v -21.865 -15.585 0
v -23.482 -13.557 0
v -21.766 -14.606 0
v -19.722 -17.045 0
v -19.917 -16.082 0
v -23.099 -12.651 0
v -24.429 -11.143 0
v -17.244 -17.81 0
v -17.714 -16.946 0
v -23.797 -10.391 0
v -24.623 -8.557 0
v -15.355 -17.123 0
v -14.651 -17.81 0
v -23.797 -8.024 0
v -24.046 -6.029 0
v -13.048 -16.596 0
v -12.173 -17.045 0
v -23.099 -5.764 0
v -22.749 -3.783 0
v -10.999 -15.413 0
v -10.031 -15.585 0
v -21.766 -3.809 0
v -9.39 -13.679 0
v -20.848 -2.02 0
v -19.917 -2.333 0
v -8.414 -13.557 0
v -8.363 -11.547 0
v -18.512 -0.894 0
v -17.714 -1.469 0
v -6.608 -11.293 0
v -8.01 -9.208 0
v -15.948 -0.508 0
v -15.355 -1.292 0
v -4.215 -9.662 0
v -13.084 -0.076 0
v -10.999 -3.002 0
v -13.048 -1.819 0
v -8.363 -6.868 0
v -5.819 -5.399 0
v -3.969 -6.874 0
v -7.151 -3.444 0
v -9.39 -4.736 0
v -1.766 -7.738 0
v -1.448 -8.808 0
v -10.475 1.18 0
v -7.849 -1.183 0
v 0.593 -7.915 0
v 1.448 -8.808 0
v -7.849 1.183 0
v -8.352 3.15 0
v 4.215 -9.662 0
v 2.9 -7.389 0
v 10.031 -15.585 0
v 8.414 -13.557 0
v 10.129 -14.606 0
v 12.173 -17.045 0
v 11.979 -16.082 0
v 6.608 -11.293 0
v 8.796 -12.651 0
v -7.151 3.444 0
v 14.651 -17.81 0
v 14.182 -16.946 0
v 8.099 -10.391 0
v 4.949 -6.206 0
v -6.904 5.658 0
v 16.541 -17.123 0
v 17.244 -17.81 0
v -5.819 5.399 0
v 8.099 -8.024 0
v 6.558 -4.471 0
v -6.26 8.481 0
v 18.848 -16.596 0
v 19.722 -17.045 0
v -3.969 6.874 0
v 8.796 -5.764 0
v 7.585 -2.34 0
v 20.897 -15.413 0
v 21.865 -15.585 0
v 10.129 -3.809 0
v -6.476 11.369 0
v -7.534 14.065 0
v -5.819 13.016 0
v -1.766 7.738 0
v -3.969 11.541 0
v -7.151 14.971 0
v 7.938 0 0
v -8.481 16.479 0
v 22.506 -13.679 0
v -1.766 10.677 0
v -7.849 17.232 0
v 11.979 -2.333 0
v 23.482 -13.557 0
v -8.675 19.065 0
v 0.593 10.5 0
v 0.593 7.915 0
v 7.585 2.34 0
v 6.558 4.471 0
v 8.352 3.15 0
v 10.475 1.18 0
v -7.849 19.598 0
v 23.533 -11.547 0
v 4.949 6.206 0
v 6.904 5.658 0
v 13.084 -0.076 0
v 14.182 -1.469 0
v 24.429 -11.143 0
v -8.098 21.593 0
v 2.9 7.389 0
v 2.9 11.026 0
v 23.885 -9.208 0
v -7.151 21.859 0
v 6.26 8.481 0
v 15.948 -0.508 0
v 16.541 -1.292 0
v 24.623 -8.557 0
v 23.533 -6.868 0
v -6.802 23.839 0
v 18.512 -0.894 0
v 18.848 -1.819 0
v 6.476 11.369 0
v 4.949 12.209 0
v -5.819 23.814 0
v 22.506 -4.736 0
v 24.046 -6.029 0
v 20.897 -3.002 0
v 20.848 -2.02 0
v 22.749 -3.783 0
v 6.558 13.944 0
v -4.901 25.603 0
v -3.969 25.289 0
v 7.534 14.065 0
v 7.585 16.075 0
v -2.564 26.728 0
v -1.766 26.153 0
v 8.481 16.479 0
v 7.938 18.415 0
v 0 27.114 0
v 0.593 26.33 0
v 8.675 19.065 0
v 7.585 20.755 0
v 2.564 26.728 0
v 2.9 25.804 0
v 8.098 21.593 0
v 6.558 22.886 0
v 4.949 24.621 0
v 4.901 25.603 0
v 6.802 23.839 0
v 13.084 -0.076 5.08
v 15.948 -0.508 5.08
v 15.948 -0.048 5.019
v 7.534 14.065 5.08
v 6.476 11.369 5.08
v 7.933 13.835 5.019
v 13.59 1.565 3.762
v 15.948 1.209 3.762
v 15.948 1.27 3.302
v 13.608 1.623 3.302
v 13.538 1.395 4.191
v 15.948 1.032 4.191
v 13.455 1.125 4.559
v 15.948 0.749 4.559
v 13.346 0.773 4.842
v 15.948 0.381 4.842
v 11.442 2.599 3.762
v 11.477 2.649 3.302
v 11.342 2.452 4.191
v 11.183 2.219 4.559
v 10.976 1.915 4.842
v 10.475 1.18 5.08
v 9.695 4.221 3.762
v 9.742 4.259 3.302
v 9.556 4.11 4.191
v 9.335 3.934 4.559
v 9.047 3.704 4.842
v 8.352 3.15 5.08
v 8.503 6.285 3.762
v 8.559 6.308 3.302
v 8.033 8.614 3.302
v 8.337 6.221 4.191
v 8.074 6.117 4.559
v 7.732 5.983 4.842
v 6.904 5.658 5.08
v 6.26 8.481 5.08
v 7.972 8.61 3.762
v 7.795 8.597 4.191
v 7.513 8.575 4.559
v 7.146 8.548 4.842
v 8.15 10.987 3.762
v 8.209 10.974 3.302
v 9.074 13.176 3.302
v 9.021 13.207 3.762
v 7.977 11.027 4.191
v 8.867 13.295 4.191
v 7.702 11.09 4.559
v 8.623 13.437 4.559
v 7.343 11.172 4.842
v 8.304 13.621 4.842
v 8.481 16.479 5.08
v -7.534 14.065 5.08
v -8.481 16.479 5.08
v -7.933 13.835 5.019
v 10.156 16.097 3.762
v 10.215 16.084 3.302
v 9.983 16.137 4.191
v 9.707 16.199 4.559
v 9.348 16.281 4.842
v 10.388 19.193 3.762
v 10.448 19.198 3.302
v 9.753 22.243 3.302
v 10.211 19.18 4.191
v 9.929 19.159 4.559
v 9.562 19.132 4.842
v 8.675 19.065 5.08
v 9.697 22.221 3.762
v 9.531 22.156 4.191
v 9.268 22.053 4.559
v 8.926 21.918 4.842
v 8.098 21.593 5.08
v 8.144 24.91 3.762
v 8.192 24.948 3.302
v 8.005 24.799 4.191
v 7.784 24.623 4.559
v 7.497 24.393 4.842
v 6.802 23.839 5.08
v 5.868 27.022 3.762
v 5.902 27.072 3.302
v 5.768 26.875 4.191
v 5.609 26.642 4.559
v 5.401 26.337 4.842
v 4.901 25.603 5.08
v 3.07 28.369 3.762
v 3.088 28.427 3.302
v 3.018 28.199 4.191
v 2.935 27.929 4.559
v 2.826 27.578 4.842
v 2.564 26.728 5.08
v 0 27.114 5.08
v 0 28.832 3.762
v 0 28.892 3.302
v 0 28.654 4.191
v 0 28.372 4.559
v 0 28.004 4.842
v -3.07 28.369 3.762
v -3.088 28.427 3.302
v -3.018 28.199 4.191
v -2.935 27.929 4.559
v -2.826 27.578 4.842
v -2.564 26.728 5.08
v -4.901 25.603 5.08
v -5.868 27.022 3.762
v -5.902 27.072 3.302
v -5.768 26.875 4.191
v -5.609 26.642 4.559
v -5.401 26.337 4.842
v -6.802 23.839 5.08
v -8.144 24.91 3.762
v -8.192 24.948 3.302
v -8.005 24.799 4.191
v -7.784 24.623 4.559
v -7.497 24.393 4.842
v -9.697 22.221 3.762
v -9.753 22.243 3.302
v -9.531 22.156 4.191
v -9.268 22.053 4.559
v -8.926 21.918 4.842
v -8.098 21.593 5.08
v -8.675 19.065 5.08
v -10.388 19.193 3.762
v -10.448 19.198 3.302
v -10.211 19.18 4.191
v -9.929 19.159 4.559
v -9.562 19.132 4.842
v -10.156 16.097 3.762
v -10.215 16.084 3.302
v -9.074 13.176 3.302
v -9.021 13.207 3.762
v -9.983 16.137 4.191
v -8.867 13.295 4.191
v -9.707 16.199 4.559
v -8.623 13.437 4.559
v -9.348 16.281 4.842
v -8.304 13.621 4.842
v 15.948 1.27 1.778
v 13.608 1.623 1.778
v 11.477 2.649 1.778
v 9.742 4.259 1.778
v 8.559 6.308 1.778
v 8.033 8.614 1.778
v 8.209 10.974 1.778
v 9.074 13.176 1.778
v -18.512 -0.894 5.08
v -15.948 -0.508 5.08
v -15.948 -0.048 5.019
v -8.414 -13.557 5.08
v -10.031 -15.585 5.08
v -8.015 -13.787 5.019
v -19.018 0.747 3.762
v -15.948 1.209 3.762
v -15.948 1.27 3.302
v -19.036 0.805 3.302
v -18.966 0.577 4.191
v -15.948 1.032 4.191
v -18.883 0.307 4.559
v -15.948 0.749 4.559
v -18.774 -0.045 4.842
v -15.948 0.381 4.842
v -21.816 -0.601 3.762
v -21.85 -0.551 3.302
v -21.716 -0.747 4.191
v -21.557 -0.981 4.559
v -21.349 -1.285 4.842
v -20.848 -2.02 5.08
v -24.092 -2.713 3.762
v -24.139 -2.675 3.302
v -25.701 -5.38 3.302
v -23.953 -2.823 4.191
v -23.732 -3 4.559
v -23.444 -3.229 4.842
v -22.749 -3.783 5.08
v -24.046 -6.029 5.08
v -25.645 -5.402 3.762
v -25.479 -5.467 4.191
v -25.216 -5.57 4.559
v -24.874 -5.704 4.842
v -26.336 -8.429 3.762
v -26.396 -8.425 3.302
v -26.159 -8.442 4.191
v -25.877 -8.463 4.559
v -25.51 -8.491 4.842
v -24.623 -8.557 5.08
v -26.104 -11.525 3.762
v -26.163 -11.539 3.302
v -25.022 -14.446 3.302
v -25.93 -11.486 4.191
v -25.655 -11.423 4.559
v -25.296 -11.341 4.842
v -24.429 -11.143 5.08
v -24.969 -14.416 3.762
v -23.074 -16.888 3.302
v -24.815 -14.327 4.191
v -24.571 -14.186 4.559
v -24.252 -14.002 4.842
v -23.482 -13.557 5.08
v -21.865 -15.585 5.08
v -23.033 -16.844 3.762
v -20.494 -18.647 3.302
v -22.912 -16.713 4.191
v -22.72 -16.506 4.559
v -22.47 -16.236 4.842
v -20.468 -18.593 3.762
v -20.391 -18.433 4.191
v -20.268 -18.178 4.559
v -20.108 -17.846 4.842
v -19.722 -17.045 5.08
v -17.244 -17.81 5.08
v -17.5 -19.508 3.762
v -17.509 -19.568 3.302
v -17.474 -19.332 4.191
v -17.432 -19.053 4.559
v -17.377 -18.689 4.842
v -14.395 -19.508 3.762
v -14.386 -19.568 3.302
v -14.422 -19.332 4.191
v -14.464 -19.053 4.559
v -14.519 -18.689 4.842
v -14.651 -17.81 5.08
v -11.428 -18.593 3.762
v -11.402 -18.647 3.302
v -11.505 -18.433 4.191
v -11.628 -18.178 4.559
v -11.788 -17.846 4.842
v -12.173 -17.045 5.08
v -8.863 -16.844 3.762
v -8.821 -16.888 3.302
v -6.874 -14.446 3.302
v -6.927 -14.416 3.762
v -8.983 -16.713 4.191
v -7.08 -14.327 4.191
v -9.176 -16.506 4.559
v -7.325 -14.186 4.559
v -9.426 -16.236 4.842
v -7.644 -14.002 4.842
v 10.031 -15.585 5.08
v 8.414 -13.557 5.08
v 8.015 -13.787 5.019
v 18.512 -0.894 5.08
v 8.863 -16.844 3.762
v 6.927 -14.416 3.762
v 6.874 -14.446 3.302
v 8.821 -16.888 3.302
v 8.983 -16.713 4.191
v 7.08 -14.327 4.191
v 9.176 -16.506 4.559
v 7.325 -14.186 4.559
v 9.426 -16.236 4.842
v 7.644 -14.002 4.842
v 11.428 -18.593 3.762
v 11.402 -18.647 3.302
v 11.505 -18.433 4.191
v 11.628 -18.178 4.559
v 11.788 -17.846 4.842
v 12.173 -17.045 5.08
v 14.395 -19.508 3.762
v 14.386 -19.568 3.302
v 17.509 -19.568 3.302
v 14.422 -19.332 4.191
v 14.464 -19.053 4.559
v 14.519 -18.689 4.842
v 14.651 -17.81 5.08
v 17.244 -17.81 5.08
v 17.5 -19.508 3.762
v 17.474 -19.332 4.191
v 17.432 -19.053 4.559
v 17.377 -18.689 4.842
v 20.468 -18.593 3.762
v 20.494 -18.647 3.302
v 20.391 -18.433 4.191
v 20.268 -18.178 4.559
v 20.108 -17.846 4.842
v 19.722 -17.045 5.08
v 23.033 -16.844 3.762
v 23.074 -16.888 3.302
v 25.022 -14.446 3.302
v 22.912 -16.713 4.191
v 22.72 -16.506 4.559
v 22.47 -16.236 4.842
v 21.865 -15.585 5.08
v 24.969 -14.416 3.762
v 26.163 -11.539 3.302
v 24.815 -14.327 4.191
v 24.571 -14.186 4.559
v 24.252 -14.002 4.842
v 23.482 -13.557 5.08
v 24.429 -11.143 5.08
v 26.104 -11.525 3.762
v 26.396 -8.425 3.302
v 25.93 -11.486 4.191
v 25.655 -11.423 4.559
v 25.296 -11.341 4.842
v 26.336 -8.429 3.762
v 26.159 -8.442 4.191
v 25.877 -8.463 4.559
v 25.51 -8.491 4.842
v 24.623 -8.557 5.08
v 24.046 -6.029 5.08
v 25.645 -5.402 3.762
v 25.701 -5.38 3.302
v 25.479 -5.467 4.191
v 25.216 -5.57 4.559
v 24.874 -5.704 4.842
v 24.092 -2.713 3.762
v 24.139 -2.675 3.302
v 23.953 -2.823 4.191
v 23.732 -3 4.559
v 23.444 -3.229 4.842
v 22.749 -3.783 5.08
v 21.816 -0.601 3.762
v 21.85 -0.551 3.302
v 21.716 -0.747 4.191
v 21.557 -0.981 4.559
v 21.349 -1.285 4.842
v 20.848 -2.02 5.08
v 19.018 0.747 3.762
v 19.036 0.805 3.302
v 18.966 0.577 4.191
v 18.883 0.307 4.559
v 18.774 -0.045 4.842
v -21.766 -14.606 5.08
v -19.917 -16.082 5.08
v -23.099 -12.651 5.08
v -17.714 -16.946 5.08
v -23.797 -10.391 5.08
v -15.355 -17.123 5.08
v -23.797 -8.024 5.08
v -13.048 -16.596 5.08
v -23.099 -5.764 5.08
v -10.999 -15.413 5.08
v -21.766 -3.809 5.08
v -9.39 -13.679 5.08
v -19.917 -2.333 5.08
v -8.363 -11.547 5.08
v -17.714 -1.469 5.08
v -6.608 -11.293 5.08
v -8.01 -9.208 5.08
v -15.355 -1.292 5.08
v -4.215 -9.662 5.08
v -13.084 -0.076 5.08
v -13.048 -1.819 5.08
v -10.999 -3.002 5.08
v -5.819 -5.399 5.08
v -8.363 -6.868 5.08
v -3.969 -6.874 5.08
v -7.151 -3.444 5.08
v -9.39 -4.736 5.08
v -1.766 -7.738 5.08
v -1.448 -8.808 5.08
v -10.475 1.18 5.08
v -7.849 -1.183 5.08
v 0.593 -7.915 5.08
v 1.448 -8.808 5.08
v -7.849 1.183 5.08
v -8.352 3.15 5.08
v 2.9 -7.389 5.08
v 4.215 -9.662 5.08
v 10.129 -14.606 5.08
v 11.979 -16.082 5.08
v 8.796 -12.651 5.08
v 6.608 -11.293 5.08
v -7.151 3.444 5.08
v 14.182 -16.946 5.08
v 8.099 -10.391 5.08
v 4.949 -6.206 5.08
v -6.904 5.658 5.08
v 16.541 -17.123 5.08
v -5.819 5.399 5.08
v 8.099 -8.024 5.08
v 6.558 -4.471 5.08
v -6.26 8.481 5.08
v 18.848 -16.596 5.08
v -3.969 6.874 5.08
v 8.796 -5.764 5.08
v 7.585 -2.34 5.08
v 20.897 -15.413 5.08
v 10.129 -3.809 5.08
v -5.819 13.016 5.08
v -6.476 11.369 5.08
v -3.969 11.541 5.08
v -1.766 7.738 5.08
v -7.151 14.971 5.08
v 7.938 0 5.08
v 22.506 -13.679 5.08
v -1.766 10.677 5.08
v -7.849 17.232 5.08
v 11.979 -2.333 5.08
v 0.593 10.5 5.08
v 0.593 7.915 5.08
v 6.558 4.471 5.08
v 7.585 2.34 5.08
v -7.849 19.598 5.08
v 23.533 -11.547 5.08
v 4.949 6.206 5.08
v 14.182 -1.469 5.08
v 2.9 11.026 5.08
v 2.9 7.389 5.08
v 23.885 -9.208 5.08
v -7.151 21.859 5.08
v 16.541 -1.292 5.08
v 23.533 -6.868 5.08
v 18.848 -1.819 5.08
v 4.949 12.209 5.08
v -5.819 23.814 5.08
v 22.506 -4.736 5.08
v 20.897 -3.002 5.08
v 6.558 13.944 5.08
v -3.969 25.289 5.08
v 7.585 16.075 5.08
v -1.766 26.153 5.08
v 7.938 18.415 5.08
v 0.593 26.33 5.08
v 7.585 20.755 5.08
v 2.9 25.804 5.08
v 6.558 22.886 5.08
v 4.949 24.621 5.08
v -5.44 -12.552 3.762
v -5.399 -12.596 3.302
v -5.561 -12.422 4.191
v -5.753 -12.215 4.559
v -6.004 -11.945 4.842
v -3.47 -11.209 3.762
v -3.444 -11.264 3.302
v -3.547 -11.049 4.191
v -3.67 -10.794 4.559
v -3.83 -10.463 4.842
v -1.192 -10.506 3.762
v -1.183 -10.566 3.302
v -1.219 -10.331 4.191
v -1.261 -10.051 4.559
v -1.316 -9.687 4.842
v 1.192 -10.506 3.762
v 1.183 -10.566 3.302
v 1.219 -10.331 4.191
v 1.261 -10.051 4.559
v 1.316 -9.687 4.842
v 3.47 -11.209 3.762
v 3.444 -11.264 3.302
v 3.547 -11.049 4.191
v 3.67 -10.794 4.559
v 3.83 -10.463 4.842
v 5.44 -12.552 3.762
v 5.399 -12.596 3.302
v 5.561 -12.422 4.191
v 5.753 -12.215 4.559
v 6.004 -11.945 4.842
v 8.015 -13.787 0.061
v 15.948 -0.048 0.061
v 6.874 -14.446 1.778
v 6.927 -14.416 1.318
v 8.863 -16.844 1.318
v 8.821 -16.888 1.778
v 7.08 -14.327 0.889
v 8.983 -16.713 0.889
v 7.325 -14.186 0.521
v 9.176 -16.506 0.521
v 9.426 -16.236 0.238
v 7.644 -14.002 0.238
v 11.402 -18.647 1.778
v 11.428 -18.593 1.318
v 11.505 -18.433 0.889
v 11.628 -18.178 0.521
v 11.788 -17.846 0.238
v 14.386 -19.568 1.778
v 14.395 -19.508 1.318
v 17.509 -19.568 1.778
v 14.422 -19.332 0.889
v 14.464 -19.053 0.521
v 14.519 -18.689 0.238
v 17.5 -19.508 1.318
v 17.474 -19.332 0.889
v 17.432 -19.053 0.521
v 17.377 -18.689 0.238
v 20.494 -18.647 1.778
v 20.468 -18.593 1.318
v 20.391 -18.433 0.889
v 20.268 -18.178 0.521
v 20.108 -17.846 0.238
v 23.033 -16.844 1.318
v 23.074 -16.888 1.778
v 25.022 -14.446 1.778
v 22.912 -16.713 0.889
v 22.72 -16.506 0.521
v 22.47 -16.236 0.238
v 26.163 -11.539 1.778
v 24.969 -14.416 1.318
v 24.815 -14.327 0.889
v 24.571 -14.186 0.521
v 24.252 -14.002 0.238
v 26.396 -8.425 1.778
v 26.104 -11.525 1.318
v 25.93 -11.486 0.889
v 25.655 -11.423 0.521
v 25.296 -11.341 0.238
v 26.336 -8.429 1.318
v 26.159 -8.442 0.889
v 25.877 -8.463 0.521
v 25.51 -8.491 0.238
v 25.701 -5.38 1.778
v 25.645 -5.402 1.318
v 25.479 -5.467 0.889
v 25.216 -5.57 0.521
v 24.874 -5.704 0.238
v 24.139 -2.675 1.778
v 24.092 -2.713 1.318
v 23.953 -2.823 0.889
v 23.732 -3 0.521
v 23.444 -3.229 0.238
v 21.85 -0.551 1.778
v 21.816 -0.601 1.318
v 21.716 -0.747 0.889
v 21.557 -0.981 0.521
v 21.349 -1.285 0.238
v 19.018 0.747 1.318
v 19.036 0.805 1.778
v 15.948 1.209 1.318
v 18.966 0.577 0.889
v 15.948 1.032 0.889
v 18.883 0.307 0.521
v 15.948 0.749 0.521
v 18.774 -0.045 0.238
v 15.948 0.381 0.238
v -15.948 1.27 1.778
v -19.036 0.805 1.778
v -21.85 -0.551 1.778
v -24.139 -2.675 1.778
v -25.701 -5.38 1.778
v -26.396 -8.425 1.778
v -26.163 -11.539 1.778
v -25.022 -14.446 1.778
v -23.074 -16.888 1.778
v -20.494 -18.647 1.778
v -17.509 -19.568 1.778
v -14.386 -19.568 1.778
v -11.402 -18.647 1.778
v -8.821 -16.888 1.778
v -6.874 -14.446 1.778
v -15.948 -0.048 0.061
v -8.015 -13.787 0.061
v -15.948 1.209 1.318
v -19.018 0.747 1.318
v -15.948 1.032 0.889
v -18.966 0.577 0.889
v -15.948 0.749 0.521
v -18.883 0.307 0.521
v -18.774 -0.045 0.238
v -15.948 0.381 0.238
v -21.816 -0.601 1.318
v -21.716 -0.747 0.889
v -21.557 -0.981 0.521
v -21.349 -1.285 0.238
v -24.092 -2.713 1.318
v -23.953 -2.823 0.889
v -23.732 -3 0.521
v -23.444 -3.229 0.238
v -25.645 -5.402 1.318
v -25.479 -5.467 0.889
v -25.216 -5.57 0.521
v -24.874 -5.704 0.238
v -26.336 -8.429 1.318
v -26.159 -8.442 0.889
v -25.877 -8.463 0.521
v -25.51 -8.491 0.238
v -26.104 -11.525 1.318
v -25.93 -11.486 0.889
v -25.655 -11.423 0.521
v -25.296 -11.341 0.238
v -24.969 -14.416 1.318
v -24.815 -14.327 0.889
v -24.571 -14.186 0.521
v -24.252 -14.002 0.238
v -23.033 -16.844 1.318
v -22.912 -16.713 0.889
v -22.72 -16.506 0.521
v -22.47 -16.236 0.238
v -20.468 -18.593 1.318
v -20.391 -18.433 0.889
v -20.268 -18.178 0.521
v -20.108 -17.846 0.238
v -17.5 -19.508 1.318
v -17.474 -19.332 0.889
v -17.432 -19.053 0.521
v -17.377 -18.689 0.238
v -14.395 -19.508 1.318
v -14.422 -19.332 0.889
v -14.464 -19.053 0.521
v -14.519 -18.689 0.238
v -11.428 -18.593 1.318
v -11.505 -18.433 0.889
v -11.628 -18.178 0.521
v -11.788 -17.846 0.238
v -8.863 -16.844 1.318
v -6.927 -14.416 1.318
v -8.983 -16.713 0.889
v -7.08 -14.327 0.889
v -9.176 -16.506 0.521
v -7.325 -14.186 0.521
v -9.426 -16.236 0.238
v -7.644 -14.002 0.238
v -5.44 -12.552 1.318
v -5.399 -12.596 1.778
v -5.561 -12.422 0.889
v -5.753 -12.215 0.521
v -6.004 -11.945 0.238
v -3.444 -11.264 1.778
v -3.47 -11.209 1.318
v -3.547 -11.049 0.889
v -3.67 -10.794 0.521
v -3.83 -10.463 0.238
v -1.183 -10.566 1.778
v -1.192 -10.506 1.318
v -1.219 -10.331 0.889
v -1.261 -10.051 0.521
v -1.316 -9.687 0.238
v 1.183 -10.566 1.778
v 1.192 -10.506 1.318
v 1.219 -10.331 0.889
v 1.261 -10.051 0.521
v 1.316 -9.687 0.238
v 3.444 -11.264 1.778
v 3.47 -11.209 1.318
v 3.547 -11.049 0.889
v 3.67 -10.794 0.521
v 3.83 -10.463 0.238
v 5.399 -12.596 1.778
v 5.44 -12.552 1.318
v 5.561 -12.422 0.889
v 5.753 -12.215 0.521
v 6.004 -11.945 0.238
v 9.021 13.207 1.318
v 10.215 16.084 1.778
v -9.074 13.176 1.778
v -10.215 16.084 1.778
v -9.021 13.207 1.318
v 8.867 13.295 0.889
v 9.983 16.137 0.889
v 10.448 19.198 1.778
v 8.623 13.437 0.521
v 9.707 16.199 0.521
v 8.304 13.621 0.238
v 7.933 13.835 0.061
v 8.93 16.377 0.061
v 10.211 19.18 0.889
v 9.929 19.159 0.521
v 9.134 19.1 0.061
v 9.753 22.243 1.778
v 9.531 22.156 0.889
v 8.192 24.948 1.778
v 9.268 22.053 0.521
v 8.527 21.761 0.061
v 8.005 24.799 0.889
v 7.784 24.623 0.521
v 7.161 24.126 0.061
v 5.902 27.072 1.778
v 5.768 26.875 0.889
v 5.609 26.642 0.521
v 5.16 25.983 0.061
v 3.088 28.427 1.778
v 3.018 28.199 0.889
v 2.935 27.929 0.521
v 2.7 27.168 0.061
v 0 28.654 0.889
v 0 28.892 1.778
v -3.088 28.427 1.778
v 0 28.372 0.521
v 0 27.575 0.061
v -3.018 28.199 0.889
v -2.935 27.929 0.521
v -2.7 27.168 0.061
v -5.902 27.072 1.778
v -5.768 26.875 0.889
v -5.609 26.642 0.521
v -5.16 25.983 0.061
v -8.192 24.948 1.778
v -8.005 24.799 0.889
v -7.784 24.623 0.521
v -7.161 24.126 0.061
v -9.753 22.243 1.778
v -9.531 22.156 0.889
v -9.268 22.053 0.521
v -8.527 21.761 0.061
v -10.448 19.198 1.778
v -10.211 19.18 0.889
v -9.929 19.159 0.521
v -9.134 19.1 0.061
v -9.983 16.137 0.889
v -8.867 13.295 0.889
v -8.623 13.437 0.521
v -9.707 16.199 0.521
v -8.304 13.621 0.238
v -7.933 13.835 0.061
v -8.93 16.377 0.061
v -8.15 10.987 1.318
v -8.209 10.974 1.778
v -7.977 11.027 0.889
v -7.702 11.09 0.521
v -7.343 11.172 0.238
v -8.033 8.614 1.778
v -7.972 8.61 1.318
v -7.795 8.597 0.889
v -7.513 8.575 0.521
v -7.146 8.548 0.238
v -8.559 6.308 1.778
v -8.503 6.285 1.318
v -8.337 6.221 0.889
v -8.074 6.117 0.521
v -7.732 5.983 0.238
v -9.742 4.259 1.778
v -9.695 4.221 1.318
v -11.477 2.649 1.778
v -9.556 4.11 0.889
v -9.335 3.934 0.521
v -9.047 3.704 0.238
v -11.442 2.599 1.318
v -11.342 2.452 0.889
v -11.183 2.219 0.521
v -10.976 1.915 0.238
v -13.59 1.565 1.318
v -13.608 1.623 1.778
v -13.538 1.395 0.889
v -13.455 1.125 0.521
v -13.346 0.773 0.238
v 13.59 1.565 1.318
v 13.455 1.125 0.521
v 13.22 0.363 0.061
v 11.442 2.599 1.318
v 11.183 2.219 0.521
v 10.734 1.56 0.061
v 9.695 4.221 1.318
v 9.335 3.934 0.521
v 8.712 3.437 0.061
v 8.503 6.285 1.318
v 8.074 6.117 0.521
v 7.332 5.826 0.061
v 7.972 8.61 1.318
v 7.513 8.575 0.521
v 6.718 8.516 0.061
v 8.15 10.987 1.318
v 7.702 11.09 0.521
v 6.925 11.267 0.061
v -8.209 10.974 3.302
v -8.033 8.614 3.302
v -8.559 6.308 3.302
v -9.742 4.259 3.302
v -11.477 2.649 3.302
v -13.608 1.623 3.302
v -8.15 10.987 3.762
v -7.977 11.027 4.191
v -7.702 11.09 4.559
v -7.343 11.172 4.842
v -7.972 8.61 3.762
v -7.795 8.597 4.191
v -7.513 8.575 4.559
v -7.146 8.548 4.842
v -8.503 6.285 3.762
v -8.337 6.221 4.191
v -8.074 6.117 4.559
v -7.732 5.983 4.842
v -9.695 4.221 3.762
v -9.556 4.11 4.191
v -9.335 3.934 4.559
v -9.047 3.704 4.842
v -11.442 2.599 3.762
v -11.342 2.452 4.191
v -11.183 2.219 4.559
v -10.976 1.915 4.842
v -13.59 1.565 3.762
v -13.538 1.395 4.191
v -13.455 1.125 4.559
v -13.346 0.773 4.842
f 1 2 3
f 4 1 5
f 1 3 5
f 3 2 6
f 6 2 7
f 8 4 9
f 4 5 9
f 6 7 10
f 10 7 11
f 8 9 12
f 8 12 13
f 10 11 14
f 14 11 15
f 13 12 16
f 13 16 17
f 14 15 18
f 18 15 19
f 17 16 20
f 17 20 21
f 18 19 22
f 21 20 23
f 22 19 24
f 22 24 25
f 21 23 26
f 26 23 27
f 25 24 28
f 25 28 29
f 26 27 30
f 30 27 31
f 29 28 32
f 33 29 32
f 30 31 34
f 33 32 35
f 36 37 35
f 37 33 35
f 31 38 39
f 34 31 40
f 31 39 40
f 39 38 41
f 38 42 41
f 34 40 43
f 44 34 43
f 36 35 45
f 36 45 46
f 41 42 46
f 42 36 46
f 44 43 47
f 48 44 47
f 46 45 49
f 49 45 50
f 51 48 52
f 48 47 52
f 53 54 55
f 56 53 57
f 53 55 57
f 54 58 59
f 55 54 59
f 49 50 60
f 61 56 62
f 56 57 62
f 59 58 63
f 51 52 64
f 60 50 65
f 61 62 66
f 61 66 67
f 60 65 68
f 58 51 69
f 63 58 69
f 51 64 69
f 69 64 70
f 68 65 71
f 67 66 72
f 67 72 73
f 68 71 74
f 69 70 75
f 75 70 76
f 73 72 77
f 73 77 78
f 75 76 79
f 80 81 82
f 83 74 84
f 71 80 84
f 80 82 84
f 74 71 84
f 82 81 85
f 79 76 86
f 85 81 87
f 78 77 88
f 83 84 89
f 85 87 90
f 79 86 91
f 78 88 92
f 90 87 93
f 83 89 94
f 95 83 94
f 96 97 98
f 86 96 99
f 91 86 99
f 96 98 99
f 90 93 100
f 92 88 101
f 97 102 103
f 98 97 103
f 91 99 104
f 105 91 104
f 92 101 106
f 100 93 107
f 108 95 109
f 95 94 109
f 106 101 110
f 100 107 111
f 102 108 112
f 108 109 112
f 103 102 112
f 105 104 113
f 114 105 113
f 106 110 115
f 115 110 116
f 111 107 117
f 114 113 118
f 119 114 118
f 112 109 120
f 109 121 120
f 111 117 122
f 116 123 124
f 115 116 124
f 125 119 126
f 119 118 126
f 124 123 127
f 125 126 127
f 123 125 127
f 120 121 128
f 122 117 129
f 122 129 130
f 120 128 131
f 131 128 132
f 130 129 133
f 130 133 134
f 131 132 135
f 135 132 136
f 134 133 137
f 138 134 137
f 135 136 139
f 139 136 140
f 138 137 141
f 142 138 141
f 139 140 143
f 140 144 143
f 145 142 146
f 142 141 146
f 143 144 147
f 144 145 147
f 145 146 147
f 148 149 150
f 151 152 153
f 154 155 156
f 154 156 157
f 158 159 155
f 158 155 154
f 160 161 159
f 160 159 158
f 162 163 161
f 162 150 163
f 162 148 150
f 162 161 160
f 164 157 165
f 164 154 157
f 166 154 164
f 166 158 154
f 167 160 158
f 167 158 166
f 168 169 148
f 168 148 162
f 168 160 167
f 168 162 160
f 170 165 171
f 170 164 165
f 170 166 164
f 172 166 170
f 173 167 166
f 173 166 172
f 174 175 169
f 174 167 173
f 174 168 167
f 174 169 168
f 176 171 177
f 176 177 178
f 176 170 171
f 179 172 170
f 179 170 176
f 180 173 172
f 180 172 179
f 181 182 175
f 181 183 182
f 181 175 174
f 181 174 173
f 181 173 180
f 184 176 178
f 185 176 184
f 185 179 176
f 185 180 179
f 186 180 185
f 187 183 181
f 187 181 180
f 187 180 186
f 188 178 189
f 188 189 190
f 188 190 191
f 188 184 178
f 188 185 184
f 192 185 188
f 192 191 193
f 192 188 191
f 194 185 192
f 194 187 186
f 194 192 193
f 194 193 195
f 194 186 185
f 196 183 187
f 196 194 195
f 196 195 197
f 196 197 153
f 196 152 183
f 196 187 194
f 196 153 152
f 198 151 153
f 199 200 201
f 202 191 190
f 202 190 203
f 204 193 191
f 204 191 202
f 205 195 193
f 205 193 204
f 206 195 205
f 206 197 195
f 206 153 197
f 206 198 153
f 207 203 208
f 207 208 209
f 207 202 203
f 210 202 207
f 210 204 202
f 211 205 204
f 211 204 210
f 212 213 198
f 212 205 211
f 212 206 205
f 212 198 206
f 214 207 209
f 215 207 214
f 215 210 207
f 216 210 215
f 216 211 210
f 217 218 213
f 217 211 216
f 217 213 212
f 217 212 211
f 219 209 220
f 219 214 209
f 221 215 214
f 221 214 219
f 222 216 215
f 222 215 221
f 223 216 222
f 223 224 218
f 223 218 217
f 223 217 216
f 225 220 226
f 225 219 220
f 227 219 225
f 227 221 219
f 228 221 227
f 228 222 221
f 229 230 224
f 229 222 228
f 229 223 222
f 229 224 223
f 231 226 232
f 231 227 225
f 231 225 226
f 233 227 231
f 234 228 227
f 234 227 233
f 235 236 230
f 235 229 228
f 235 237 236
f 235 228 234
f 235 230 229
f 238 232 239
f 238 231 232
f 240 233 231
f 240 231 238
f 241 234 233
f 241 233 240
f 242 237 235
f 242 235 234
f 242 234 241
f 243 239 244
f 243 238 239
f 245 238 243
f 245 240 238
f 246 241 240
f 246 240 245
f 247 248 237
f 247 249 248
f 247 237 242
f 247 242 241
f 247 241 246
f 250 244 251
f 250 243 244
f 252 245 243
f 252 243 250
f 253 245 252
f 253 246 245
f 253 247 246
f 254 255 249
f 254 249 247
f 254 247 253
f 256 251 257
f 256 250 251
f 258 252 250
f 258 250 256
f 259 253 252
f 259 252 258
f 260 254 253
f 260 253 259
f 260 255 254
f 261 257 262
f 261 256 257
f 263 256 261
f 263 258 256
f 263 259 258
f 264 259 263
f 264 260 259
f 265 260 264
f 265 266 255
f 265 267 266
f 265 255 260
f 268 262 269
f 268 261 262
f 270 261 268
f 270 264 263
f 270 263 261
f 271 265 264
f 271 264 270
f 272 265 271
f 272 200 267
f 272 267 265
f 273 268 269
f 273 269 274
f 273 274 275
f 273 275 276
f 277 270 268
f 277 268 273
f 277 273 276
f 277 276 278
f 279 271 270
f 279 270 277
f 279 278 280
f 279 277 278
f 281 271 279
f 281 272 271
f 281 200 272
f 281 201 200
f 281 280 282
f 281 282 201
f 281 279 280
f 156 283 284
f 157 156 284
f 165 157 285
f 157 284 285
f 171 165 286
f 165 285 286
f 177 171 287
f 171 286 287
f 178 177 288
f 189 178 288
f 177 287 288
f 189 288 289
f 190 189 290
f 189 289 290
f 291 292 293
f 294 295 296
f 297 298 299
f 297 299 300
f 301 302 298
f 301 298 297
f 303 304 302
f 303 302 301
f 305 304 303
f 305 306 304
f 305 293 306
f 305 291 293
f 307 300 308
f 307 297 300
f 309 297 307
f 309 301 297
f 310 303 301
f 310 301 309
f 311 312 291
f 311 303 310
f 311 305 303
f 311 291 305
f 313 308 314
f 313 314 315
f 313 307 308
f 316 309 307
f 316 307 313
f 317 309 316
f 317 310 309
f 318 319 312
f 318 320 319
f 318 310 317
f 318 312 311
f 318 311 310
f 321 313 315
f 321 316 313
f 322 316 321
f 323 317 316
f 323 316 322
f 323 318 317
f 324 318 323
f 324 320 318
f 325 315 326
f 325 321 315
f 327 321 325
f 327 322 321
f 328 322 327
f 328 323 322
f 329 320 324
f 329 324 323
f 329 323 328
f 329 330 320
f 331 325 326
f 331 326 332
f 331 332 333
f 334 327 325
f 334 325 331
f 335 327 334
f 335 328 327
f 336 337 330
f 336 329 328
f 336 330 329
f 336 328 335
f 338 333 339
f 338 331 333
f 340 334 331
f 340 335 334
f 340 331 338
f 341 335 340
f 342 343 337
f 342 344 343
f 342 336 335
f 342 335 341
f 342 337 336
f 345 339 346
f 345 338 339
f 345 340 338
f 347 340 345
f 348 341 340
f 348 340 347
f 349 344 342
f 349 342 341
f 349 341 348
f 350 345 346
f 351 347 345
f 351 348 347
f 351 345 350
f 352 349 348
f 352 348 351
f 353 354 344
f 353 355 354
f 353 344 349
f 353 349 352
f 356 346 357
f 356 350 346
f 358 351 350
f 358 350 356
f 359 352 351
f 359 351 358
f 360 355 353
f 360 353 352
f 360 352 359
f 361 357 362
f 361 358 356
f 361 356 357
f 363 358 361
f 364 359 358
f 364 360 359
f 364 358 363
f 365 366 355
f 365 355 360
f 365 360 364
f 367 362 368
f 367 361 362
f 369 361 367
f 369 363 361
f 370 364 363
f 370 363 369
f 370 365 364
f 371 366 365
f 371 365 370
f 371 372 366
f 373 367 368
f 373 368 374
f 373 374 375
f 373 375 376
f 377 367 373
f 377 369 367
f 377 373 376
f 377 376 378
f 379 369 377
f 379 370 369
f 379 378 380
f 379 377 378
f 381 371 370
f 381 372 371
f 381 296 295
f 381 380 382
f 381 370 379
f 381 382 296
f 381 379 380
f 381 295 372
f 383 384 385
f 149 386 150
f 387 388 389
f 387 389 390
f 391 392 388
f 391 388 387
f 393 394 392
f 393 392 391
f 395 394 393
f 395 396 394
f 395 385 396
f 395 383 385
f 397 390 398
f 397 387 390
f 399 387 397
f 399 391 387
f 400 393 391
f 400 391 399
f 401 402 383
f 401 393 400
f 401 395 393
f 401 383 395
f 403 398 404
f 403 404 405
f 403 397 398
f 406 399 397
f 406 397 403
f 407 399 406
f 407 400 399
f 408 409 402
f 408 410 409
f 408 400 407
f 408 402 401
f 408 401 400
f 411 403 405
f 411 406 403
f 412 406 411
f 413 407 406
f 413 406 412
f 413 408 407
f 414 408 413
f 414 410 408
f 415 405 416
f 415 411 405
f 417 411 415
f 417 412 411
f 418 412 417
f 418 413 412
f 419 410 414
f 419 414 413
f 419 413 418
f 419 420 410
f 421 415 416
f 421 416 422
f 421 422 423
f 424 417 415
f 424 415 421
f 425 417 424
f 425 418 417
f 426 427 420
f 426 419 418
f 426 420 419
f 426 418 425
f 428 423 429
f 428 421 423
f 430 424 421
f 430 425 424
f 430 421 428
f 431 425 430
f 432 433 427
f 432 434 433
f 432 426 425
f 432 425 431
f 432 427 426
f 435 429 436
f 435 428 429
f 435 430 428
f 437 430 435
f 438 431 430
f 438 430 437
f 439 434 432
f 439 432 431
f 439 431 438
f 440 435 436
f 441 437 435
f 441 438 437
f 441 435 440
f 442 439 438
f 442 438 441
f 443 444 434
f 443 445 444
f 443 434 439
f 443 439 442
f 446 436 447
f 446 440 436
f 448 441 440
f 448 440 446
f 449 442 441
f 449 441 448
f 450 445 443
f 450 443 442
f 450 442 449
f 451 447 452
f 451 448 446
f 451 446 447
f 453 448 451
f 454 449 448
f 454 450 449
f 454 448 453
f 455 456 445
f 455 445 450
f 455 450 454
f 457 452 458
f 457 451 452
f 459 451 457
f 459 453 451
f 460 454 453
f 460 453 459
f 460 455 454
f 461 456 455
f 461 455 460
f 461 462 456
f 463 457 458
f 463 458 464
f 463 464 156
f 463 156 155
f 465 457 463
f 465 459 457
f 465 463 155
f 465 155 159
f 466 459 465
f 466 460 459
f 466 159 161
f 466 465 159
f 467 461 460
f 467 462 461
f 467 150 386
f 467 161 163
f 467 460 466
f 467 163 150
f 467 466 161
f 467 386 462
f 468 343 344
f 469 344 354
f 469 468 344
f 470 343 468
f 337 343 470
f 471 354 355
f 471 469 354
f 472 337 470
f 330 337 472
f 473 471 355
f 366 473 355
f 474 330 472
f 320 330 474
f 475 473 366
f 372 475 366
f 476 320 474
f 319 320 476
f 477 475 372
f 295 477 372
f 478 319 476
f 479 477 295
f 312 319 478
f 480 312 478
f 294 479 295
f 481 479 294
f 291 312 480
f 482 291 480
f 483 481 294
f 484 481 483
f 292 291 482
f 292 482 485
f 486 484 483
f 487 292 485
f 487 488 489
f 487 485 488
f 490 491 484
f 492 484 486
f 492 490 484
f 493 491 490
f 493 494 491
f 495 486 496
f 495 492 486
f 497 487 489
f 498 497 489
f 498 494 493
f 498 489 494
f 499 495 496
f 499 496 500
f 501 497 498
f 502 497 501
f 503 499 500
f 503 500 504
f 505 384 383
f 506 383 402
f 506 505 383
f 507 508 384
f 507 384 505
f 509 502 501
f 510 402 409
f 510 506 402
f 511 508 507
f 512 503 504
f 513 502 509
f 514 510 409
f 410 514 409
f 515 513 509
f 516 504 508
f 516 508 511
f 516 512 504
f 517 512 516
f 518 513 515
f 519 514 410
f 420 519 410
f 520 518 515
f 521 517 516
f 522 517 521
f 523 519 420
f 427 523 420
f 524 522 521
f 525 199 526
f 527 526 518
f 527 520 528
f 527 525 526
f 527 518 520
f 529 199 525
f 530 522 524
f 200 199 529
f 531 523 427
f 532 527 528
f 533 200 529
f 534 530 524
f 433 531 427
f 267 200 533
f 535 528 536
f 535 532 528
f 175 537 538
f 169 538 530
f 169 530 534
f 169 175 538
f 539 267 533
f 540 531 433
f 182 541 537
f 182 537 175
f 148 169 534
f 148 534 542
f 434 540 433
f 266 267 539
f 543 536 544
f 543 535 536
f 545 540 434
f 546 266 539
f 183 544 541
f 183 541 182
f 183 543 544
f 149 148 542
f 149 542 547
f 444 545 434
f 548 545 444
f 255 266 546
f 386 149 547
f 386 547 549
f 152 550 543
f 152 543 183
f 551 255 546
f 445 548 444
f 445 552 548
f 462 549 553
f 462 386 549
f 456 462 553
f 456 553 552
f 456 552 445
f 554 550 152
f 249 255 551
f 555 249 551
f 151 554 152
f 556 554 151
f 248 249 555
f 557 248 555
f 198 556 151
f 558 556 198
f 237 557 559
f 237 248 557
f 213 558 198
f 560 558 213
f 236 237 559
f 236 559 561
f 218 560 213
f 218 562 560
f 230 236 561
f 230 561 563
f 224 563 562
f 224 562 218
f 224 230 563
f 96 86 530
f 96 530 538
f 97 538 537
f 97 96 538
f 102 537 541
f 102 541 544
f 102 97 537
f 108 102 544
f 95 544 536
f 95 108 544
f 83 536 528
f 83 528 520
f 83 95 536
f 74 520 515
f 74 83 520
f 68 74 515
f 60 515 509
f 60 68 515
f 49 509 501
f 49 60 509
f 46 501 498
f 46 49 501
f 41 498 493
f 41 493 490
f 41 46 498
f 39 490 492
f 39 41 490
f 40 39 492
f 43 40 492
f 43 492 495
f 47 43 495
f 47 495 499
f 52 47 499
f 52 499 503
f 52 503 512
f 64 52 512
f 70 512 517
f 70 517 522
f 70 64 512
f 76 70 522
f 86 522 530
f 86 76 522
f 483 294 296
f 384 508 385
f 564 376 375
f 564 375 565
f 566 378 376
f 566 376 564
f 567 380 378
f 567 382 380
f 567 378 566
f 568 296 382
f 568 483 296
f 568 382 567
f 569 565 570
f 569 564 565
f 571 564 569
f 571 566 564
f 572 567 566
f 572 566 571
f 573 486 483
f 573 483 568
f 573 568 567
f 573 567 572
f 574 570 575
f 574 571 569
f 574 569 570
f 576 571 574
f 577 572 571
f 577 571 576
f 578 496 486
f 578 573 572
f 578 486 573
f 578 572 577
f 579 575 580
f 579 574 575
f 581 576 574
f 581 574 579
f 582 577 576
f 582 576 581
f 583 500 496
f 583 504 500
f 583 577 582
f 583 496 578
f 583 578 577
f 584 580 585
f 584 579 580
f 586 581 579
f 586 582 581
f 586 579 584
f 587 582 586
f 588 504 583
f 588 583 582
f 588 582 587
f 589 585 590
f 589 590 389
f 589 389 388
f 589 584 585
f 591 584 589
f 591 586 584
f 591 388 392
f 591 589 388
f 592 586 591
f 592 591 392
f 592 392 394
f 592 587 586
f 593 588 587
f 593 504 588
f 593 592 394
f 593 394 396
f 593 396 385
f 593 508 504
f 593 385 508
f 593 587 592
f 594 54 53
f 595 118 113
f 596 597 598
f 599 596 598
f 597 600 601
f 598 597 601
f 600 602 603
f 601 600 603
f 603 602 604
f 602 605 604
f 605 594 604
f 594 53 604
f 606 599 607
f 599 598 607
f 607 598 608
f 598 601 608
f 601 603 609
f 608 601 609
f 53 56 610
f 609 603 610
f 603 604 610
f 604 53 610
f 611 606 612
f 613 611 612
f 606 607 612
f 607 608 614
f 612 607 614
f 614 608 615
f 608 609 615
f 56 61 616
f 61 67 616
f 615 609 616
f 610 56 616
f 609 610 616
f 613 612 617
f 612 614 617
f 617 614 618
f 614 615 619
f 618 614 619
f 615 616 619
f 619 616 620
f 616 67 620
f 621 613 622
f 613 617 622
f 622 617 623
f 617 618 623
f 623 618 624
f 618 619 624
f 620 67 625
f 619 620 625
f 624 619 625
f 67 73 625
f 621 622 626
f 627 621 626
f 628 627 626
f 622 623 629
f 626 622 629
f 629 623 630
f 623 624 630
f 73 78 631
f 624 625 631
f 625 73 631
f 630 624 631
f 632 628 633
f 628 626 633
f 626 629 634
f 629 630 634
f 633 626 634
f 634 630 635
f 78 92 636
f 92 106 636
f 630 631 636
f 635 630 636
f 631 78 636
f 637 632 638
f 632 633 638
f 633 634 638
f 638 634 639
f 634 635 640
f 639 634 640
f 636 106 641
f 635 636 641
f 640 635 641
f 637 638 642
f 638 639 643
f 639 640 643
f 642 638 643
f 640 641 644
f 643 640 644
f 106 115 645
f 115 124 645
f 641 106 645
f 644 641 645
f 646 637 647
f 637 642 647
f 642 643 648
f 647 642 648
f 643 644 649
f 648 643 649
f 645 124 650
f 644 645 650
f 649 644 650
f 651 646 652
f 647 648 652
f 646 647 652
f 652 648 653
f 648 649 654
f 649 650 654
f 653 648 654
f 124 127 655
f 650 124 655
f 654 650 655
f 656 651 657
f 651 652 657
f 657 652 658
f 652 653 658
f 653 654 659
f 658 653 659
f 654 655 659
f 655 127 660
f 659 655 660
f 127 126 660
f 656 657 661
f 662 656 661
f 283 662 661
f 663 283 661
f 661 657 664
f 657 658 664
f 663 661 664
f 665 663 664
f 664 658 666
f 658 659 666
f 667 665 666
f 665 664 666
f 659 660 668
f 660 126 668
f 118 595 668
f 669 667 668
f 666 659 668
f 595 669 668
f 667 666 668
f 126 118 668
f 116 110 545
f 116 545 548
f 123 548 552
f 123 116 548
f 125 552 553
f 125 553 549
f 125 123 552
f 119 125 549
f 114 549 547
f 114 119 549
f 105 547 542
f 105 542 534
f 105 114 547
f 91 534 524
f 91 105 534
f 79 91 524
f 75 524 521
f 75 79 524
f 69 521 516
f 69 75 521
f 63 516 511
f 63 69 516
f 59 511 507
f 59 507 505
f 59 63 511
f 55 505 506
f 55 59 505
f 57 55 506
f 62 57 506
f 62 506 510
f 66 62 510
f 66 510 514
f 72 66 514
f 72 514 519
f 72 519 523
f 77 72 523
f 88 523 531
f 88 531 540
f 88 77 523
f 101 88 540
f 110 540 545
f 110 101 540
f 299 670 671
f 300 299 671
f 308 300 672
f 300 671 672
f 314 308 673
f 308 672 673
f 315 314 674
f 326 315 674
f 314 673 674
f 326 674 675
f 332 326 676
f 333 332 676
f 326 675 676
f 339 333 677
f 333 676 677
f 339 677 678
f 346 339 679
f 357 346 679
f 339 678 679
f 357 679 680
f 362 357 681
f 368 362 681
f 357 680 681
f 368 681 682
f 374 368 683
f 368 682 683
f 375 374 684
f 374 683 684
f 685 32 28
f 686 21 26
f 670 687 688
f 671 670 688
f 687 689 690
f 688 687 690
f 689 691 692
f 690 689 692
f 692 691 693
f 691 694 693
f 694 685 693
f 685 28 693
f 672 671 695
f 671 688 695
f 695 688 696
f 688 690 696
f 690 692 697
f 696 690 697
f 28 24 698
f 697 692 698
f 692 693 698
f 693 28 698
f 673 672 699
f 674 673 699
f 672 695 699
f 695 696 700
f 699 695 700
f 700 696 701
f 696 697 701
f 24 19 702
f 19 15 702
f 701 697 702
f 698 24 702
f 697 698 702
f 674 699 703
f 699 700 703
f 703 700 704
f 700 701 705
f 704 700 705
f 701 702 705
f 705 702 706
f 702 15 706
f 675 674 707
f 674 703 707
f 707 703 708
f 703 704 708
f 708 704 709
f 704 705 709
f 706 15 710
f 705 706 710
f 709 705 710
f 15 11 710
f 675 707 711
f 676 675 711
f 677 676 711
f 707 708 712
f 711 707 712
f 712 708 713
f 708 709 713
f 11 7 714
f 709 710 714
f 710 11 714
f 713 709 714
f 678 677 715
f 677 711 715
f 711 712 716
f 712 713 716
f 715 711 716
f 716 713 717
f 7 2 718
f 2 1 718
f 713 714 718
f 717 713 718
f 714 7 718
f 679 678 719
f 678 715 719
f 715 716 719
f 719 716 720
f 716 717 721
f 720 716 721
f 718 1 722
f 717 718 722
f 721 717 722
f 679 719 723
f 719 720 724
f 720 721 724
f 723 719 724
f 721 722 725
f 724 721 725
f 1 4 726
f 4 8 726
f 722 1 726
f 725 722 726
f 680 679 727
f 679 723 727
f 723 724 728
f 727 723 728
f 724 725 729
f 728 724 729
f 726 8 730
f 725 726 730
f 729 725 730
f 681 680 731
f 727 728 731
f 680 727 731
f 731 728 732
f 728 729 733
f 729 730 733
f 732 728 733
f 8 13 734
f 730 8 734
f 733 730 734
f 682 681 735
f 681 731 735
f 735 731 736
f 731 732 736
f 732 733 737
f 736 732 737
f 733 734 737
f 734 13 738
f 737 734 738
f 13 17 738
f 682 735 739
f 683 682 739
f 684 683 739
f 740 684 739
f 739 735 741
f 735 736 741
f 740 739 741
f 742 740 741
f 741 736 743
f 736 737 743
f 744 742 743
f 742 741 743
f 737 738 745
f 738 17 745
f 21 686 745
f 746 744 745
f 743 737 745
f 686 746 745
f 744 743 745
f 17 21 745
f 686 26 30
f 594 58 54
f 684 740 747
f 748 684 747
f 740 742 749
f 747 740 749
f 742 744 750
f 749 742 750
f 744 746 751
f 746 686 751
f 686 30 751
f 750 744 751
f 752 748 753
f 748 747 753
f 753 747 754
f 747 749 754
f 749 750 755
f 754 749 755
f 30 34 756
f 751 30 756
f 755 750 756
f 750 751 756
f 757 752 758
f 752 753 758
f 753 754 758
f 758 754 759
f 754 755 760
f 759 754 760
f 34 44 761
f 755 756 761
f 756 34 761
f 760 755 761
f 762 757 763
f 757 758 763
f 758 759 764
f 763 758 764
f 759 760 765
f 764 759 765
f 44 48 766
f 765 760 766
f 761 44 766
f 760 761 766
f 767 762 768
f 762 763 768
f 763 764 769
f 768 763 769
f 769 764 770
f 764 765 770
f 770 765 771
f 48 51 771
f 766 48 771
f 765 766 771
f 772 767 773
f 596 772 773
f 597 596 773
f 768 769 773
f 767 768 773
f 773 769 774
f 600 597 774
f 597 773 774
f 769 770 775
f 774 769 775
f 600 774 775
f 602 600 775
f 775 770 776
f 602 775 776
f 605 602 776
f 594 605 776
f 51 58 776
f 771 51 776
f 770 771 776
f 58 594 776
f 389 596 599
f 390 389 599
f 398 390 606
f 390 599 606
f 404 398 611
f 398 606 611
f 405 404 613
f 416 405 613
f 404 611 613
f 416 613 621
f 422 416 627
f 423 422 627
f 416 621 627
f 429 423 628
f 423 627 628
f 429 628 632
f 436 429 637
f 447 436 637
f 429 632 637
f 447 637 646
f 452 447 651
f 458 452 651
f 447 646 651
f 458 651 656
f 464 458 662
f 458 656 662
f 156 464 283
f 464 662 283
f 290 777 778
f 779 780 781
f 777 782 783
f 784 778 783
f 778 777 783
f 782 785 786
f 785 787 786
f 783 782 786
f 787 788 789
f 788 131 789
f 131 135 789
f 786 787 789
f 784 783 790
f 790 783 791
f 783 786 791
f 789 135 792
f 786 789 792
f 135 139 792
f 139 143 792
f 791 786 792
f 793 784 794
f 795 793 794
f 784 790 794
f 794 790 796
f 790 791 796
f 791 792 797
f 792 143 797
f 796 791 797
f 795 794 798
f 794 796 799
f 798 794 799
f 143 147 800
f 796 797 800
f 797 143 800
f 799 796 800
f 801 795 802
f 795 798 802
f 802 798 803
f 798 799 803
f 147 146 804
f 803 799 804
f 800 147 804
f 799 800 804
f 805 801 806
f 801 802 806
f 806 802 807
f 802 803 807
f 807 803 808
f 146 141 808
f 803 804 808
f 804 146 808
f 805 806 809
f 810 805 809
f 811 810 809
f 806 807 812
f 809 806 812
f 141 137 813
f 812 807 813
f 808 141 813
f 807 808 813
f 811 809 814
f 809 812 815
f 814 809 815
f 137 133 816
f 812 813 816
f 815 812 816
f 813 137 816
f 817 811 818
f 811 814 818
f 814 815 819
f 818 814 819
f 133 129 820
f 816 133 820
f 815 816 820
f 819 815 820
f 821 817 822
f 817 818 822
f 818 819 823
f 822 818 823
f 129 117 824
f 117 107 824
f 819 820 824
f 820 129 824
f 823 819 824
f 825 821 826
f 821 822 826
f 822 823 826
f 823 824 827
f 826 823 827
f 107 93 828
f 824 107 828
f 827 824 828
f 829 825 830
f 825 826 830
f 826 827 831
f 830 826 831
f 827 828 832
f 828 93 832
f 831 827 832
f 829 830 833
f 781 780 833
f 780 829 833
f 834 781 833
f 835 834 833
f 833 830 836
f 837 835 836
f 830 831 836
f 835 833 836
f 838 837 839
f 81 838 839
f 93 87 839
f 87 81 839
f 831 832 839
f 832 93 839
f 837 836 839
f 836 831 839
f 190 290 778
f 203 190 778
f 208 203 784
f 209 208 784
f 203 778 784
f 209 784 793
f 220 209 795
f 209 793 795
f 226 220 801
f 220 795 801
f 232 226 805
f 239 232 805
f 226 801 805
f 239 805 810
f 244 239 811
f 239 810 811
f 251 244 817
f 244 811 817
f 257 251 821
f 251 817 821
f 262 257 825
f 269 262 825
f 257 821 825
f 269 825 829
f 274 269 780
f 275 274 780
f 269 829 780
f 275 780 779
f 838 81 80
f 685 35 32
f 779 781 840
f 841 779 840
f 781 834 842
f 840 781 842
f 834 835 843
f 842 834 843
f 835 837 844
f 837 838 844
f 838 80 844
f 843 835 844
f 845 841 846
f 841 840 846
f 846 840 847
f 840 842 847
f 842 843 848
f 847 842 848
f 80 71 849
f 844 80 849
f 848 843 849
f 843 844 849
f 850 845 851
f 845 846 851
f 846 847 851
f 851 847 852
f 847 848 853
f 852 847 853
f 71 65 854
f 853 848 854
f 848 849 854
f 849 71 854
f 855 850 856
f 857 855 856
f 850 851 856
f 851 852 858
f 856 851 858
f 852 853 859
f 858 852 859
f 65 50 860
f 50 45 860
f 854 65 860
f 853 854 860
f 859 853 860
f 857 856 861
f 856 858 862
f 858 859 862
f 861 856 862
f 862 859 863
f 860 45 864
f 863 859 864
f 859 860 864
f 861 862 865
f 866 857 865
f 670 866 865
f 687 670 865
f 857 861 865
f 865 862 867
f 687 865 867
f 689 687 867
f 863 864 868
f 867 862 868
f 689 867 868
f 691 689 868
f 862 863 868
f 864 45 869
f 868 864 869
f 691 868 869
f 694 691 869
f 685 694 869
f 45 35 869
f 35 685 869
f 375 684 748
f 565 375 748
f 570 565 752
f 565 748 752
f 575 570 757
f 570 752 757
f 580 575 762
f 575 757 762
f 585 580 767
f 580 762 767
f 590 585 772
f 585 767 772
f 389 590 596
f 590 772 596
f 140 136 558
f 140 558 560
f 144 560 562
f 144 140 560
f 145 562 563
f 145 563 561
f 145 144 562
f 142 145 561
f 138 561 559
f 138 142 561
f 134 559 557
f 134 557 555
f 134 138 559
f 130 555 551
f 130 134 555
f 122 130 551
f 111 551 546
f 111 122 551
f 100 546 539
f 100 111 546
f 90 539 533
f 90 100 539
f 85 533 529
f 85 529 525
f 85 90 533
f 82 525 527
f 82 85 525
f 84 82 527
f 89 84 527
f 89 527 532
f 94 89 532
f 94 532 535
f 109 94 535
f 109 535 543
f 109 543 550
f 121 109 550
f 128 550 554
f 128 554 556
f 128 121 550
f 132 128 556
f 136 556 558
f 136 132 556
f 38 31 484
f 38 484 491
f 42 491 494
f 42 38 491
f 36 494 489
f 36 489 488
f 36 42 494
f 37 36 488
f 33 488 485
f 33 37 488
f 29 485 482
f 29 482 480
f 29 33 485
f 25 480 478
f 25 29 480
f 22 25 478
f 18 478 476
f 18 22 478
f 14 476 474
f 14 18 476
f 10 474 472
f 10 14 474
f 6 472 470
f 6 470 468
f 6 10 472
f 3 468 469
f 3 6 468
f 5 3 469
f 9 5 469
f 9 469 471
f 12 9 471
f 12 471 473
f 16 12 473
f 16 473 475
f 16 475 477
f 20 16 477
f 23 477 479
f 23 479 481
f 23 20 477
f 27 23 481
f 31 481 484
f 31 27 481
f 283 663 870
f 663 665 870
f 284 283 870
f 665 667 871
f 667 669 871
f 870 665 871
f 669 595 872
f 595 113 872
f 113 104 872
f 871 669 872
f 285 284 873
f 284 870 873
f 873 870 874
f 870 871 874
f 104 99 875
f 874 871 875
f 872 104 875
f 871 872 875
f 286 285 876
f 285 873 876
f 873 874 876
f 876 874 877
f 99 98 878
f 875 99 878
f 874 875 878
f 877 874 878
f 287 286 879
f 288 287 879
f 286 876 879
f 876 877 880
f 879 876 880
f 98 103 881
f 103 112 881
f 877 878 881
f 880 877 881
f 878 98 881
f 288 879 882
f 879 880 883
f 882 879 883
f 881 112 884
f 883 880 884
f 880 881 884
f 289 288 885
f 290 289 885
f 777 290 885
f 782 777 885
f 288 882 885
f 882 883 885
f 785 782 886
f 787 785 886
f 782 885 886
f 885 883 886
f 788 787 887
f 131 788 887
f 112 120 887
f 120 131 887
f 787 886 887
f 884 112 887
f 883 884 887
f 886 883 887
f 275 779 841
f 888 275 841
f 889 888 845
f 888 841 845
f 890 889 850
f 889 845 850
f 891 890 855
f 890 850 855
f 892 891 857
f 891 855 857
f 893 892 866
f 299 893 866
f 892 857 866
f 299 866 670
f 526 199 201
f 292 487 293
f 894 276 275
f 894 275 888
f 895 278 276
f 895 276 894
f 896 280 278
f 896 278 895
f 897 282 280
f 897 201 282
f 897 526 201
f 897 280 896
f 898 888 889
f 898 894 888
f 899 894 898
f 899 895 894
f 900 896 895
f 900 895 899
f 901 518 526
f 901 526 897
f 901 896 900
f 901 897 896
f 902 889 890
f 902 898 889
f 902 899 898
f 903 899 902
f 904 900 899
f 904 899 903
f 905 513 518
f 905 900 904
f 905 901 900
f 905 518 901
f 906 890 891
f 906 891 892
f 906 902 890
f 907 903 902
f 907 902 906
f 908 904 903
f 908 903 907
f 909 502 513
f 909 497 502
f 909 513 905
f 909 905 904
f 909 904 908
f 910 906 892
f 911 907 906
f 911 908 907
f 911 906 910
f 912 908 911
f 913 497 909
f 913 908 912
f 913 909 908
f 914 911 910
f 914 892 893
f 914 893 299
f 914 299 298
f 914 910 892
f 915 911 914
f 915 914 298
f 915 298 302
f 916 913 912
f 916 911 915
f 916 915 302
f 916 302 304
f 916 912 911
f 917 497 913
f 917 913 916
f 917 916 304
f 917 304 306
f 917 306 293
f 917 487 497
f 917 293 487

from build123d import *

# Parameters (mm, degrees)
F0_R     = 7.9375
F1_DEPTH = 5.08
F2_R     = 1.778


with BuildPart() as f1:
    # F0 (on Top) → F1 (new body)
    with BuildSketch(Plane.XY):
        with BuildLine():
            ThreePointArc((15.947858, 1.27), (9.073781, 5.23875), (9.073781, 13.17625))
            ThreePointArc((9.073781, 13.17625), (0, 28.8925), (-9.073781, 13.17625))
            ThreePointArc((-9.073781, 13.17625), (-9.073781, 5.23875), (-15.947858, 1.27))
            ThreePointArc((-15.947858, 1.27), (-25.021639, -14.44625), (-6.874077, -14.44625))
            ThreePointArc((-6.874077, -14.44625), (0, -10.4775), (6.874077, -14.44625))
            ThreePointArc((6.874077, -14.44625), (25.021639, -14.44625), (15.947858, 1.27))
        make_face()
        with Locations((-15.947858, -9.2075)):
            Circle(F0_R, mode=Mode.SUBTRACT)
        with Locations((15.947858, -9.2075)):
            Circle(F0_R, mode=Mode.SUBTRACT)
        Circle(F0_R, mode=Mode.SUBTRACT)
        with Locations((0, 18.415)):
            Circle(F0_R, mode=Mode.SUBTRACT)
    extrude(amount=F1_DEPTH)

    # F2
    f2_edges = [f1.edges().sort_by_distance(p)[0] for p in [
        (-9.073781, 5.23875, 5.08),
        (0, 28.8925, 0),
    ]]
    fillet(f2_edges, radius=F2_R)


solid = f1.part
